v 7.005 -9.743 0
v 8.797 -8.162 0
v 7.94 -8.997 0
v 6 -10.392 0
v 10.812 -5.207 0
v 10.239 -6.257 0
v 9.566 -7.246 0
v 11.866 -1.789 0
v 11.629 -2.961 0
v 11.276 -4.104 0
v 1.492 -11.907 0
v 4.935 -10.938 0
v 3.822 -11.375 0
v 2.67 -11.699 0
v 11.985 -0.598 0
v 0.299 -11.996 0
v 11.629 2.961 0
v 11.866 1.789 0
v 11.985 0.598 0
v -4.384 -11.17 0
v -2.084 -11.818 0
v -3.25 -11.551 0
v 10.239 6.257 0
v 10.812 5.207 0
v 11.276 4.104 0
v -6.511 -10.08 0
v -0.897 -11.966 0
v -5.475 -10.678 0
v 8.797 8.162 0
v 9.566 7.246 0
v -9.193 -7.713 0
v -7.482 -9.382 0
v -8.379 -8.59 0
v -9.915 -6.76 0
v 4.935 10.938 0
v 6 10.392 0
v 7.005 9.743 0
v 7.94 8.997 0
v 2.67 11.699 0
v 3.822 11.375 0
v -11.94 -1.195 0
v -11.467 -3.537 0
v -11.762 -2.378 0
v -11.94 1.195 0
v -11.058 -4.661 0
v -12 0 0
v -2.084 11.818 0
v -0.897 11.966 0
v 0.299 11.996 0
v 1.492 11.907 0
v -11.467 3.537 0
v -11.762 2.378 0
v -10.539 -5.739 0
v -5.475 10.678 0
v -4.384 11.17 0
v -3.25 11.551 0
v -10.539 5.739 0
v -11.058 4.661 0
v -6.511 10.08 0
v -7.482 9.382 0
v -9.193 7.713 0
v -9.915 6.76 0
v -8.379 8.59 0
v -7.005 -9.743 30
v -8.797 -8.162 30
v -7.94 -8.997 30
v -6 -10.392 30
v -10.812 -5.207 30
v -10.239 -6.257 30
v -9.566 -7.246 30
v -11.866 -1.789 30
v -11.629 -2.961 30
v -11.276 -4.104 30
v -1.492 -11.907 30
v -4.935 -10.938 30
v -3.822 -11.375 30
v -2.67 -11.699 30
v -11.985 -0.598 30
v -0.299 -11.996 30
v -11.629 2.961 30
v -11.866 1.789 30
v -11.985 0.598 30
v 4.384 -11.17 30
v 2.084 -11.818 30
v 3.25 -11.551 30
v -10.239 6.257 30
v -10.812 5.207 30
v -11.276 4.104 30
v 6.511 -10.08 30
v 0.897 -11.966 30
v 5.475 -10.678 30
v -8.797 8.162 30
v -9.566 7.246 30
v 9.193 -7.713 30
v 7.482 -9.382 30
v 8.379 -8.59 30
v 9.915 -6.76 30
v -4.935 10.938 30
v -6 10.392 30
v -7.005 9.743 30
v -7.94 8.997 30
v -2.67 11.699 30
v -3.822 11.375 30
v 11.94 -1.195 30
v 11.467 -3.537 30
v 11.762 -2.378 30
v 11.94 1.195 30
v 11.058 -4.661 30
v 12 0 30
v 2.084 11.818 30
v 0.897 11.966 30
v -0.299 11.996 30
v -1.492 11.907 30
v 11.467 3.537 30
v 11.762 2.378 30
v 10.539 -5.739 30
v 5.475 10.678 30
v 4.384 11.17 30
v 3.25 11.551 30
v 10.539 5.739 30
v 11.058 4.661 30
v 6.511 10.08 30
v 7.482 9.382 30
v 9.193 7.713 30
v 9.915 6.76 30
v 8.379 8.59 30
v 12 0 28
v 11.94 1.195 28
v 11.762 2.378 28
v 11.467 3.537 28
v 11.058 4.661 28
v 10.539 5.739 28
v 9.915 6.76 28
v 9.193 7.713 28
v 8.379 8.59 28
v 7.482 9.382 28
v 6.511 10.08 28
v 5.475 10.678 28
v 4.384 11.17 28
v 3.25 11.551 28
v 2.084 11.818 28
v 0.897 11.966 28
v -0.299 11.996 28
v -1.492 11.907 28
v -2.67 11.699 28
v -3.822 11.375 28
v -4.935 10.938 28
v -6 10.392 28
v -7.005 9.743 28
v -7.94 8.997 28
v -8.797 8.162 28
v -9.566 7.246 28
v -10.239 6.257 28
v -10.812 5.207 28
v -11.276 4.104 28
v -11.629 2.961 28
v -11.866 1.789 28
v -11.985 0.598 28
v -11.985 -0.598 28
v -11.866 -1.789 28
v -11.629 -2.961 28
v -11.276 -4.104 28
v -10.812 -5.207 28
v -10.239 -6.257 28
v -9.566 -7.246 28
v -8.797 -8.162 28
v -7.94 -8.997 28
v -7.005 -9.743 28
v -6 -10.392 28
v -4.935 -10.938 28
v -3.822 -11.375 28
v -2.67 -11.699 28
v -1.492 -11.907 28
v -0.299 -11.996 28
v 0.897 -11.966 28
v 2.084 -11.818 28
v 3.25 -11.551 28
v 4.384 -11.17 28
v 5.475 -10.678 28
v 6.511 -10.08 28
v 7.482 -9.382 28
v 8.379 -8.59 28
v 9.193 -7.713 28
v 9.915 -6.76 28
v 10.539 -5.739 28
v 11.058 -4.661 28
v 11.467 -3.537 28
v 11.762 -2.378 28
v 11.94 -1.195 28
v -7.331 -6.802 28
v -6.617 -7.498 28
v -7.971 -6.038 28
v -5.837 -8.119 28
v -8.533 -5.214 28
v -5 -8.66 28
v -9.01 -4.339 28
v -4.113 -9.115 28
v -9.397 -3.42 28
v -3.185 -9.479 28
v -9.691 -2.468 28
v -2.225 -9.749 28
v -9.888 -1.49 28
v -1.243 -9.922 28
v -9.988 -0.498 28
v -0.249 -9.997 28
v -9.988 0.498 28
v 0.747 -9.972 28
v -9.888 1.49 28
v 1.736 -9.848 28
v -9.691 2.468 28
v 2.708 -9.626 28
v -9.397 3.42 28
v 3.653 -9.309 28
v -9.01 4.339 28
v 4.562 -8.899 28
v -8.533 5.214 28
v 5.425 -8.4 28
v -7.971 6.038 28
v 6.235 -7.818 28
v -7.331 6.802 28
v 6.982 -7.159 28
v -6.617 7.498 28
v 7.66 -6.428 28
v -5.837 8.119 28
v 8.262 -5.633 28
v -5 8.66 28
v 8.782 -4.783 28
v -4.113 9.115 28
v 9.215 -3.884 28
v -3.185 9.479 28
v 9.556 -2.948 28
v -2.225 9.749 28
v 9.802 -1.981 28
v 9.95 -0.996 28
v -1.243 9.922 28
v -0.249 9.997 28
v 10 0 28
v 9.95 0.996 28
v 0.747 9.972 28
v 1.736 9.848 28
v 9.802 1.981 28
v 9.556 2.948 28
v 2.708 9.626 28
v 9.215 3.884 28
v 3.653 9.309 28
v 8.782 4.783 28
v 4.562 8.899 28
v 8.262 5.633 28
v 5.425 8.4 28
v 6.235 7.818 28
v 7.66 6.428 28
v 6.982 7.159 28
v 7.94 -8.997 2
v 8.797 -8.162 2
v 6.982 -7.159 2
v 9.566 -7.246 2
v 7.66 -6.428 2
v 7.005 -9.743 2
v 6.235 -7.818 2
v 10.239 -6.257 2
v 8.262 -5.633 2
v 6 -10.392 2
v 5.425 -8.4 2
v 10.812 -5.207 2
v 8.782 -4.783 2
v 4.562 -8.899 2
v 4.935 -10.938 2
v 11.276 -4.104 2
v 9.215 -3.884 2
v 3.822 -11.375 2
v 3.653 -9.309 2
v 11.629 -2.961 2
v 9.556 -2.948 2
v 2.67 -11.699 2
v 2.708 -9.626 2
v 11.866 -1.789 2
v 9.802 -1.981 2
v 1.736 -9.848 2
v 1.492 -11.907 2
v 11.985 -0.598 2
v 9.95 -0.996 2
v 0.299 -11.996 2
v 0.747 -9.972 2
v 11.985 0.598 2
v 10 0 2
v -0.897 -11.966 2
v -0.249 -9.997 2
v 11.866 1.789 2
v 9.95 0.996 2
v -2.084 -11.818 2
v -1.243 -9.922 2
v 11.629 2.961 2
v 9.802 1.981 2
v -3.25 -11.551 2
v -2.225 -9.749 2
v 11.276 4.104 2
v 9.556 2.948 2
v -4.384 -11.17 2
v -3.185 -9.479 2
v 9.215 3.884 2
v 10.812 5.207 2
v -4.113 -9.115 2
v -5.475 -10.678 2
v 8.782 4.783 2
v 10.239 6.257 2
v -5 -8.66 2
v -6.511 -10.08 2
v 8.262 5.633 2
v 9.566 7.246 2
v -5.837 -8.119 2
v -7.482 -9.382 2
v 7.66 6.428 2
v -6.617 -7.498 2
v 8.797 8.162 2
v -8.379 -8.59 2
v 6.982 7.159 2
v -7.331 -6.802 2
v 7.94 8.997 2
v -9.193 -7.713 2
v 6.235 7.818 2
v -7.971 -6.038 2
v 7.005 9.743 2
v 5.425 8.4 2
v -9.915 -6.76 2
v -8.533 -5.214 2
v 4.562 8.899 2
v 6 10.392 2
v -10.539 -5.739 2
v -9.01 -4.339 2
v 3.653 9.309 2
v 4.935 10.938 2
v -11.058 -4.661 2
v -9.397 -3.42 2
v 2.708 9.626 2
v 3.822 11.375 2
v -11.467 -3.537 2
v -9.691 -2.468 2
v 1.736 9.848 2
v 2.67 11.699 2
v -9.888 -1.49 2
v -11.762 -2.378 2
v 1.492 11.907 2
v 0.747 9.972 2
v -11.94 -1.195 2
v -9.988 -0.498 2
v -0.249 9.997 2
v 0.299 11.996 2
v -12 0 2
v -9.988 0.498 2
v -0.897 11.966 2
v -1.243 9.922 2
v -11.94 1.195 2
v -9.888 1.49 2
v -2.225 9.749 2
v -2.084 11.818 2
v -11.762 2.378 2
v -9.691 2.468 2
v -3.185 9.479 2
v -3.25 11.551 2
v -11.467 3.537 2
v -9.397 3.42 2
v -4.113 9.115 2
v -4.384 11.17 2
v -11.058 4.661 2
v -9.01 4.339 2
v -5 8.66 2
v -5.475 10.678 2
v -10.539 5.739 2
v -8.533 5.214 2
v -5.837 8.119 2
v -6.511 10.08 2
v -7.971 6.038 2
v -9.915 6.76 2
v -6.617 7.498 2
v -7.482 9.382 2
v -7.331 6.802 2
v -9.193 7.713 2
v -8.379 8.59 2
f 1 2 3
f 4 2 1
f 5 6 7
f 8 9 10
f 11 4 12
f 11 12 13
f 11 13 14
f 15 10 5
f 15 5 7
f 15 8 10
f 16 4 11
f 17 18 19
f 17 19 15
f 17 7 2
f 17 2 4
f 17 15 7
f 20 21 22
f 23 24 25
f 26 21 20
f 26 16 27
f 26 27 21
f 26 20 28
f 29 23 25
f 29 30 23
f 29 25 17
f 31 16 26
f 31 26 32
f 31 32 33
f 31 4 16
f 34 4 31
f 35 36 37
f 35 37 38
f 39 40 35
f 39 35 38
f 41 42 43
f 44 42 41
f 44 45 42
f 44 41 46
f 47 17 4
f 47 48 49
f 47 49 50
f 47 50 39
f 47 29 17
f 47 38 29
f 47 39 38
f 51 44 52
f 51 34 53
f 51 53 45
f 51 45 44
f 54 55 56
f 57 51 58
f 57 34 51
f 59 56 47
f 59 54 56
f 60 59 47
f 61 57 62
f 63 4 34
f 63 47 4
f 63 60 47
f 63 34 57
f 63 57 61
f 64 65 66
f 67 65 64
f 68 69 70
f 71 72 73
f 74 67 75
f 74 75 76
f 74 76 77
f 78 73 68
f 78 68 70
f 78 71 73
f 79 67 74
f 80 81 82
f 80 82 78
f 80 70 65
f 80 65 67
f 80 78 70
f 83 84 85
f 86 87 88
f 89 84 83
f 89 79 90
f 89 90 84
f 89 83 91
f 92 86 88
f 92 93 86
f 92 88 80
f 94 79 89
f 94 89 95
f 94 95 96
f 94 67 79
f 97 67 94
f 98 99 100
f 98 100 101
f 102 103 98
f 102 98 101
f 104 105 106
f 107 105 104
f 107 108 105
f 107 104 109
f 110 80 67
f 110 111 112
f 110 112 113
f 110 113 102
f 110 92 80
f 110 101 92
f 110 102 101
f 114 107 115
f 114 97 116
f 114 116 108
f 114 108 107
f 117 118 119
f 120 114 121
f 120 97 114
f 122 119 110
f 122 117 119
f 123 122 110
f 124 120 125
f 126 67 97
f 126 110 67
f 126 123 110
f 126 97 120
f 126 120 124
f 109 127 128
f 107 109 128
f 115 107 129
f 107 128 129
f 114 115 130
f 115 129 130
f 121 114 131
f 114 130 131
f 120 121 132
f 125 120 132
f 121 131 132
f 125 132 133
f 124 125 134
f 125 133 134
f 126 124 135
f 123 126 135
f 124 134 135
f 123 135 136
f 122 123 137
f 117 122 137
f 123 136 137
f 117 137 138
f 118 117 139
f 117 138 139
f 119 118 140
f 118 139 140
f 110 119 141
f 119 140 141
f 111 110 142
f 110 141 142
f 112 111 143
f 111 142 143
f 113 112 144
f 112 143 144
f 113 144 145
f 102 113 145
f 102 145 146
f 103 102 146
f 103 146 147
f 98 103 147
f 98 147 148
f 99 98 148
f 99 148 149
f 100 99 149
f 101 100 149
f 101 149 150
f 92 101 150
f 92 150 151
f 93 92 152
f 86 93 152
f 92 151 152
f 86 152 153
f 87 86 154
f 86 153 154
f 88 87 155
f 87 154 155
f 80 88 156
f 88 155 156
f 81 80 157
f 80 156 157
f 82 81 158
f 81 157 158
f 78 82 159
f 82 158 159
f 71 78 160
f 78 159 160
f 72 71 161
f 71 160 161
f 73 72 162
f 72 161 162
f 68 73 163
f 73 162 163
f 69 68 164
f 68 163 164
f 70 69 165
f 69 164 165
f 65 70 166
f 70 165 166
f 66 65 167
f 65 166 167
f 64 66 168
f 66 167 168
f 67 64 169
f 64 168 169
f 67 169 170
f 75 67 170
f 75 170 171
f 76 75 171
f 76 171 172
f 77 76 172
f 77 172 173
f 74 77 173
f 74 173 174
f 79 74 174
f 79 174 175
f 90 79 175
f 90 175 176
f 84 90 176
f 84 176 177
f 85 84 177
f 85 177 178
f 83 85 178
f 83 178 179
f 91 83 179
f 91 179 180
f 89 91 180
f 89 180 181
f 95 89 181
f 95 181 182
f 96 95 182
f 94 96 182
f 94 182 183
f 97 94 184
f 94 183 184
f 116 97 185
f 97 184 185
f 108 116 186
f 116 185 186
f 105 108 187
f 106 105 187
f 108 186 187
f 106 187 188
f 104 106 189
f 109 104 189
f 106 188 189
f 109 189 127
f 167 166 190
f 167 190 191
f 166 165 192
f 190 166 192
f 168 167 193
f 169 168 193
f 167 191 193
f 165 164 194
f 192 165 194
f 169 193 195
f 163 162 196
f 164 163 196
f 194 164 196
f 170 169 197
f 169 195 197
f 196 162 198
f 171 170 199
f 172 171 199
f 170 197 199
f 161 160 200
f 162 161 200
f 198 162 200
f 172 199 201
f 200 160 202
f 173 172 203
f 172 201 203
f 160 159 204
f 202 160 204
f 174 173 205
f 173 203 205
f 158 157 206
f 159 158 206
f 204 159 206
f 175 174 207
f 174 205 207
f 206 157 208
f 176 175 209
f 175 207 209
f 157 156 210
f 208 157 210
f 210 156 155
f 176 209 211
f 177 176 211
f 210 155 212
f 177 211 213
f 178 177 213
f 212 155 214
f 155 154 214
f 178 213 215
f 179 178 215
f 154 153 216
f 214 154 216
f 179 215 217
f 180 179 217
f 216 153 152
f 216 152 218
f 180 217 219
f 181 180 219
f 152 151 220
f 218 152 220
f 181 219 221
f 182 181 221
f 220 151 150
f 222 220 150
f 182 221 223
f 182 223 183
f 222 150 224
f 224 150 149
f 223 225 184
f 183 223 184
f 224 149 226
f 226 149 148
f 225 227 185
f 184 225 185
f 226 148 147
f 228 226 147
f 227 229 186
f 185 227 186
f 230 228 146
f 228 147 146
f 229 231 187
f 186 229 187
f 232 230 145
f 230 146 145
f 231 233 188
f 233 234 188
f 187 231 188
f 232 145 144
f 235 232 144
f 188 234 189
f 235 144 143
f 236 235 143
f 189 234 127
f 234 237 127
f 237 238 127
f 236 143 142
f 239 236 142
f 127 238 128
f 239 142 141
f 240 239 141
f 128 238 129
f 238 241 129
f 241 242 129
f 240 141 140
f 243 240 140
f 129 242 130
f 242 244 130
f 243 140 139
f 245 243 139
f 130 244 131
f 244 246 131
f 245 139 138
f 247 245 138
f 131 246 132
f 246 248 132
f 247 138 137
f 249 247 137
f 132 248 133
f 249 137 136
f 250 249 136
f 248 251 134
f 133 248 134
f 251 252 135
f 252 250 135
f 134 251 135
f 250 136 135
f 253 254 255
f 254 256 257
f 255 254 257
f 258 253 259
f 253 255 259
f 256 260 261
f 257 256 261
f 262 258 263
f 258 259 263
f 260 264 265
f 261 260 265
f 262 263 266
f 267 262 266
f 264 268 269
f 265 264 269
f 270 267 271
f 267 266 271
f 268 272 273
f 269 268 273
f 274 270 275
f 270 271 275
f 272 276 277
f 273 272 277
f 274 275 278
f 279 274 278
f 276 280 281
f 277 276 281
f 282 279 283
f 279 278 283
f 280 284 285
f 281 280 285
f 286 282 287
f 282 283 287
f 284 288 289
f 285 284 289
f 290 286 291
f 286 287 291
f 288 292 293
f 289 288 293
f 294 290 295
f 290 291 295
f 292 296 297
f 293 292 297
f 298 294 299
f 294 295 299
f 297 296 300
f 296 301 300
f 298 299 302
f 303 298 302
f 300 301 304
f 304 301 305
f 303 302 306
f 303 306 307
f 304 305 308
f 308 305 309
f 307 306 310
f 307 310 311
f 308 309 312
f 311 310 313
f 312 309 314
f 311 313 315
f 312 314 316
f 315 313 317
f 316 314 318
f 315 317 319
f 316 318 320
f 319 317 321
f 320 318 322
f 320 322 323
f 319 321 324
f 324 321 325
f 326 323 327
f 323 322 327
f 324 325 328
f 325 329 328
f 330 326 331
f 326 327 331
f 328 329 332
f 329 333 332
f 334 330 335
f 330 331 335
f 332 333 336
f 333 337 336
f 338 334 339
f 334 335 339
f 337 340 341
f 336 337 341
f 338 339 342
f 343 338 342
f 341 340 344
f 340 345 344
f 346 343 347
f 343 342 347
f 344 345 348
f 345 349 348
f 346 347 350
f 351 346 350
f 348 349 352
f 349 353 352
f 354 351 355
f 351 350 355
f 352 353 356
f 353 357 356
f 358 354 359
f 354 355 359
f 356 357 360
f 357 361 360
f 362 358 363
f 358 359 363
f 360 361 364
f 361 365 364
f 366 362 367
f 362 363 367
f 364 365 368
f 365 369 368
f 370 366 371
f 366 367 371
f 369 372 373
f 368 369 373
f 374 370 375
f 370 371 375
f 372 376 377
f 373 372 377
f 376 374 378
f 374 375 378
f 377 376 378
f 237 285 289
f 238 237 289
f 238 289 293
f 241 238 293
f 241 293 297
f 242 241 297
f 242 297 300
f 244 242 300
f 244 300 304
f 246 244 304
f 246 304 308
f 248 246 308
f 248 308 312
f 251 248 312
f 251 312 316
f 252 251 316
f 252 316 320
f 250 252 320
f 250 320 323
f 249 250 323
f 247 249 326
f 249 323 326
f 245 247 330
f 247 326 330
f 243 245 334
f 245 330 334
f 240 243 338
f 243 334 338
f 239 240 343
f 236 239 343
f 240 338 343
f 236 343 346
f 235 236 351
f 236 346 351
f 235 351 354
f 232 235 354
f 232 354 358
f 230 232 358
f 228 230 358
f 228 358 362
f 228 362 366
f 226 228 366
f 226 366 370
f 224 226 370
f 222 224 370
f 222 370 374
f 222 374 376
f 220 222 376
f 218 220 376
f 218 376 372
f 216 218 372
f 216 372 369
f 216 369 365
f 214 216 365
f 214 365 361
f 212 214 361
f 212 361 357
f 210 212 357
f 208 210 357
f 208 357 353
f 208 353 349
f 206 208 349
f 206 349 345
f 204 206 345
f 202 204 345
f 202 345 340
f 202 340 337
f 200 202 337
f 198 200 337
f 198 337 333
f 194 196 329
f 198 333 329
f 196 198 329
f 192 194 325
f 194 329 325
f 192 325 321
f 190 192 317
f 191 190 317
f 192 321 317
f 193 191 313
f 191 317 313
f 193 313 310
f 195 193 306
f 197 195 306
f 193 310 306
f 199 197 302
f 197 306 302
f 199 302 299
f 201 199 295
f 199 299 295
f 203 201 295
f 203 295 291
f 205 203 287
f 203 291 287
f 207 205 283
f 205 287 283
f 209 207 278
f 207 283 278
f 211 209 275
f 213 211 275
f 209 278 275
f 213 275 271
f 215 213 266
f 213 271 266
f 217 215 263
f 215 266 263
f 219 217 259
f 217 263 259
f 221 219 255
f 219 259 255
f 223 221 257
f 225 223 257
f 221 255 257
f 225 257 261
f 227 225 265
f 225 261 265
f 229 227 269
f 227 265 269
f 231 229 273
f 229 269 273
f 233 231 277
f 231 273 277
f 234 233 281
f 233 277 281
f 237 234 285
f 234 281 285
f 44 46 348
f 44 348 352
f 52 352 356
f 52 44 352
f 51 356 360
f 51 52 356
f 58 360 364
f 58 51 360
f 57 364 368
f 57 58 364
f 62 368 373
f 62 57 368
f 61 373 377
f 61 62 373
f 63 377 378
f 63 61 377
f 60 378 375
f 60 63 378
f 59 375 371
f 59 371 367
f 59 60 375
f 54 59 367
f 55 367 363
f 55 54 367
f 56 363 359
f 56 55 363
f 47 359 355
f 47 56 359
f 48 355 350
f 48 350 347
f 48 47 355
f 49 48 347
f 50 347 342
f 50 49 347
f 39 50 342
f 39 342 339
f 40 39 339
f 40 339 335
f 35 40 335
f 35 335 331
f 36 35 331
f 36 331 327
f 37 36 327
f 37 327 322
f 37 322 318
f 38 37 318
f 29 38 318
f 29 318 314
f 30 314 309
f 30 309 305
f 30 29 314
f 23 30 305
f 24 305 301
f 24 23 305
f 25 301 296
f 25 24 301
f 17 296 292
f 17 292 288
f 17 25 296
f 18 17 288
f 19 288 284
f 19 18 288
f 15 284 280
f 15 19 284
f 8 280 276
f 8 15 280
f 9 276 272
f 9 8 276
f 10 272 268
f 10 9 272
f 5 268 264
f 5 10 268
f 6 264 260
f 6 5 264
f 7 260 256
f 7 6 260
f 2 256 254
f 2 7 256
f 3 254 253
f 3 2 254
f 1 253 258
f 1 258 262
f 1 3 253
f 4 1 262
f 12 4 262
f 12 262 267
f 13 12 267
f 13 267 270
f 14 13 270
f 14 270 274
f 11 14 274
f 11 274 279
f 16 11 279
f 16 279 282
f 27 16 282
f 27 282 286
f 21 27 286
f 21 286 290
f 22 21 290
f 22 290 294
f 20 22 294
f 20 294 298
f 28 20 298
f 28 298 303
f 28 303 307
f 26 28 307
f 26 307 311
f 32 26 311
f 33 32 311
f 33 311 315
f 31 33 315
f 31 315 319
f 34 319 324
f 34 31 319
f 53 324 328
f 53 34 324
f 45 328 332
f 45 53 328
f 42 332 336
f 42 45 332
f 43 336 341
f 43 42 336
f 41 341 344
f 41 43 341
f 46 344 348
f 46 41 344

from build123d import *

# Parameters (mm, degrees)
SKETCH_1_R        = 10
EXTRUDE_1_DEPTH   = 30
EXTRUDE_START     = -2
SKETCH_2_R        = 12
SKETCH_2_R_2      = 10
EXTRUDE_1_2_DEPTH = 2
SKETCH_3_R        = 12
SKETCH_3_R_2      = 10
EXTRUDE_2_DEPTH   = 2


with BuildPart() as part:
    # 草图1 → Extrude 1 (new body)
    with BuildSketch(Plane.XY):
        Circle(SKETCH_1_R)
    extrude(amount=EXTRUDE_1_DEPTH)

    # 草图2 → Extrude 1 2 (add)
    with BuildSketch(Plane.XY.offset(30).offset(EXTRUDE_START)):
        Circle(SKETCH_2_R)
        Circle(SKETCH_2_R_2, mode=Mode.SUBTRACT)
    extrude(amount=EXTRUDE_1_2_DEPTH)

    # 草图3 → 拉伸-薄壁2 (add)
    with BuildSketch(Plane(origin=(0, 0, 0), x_dir=(-1, 0, 0), z_dir=(0, 0, -1))):
        Circle(SKETCH_3_R)
        Circle(SKETCH_3_R_2, mode=Mode.SUBTRACT)
    extrude(amount=-EXTRUDE_2_DEPTH)


solid = part.part
